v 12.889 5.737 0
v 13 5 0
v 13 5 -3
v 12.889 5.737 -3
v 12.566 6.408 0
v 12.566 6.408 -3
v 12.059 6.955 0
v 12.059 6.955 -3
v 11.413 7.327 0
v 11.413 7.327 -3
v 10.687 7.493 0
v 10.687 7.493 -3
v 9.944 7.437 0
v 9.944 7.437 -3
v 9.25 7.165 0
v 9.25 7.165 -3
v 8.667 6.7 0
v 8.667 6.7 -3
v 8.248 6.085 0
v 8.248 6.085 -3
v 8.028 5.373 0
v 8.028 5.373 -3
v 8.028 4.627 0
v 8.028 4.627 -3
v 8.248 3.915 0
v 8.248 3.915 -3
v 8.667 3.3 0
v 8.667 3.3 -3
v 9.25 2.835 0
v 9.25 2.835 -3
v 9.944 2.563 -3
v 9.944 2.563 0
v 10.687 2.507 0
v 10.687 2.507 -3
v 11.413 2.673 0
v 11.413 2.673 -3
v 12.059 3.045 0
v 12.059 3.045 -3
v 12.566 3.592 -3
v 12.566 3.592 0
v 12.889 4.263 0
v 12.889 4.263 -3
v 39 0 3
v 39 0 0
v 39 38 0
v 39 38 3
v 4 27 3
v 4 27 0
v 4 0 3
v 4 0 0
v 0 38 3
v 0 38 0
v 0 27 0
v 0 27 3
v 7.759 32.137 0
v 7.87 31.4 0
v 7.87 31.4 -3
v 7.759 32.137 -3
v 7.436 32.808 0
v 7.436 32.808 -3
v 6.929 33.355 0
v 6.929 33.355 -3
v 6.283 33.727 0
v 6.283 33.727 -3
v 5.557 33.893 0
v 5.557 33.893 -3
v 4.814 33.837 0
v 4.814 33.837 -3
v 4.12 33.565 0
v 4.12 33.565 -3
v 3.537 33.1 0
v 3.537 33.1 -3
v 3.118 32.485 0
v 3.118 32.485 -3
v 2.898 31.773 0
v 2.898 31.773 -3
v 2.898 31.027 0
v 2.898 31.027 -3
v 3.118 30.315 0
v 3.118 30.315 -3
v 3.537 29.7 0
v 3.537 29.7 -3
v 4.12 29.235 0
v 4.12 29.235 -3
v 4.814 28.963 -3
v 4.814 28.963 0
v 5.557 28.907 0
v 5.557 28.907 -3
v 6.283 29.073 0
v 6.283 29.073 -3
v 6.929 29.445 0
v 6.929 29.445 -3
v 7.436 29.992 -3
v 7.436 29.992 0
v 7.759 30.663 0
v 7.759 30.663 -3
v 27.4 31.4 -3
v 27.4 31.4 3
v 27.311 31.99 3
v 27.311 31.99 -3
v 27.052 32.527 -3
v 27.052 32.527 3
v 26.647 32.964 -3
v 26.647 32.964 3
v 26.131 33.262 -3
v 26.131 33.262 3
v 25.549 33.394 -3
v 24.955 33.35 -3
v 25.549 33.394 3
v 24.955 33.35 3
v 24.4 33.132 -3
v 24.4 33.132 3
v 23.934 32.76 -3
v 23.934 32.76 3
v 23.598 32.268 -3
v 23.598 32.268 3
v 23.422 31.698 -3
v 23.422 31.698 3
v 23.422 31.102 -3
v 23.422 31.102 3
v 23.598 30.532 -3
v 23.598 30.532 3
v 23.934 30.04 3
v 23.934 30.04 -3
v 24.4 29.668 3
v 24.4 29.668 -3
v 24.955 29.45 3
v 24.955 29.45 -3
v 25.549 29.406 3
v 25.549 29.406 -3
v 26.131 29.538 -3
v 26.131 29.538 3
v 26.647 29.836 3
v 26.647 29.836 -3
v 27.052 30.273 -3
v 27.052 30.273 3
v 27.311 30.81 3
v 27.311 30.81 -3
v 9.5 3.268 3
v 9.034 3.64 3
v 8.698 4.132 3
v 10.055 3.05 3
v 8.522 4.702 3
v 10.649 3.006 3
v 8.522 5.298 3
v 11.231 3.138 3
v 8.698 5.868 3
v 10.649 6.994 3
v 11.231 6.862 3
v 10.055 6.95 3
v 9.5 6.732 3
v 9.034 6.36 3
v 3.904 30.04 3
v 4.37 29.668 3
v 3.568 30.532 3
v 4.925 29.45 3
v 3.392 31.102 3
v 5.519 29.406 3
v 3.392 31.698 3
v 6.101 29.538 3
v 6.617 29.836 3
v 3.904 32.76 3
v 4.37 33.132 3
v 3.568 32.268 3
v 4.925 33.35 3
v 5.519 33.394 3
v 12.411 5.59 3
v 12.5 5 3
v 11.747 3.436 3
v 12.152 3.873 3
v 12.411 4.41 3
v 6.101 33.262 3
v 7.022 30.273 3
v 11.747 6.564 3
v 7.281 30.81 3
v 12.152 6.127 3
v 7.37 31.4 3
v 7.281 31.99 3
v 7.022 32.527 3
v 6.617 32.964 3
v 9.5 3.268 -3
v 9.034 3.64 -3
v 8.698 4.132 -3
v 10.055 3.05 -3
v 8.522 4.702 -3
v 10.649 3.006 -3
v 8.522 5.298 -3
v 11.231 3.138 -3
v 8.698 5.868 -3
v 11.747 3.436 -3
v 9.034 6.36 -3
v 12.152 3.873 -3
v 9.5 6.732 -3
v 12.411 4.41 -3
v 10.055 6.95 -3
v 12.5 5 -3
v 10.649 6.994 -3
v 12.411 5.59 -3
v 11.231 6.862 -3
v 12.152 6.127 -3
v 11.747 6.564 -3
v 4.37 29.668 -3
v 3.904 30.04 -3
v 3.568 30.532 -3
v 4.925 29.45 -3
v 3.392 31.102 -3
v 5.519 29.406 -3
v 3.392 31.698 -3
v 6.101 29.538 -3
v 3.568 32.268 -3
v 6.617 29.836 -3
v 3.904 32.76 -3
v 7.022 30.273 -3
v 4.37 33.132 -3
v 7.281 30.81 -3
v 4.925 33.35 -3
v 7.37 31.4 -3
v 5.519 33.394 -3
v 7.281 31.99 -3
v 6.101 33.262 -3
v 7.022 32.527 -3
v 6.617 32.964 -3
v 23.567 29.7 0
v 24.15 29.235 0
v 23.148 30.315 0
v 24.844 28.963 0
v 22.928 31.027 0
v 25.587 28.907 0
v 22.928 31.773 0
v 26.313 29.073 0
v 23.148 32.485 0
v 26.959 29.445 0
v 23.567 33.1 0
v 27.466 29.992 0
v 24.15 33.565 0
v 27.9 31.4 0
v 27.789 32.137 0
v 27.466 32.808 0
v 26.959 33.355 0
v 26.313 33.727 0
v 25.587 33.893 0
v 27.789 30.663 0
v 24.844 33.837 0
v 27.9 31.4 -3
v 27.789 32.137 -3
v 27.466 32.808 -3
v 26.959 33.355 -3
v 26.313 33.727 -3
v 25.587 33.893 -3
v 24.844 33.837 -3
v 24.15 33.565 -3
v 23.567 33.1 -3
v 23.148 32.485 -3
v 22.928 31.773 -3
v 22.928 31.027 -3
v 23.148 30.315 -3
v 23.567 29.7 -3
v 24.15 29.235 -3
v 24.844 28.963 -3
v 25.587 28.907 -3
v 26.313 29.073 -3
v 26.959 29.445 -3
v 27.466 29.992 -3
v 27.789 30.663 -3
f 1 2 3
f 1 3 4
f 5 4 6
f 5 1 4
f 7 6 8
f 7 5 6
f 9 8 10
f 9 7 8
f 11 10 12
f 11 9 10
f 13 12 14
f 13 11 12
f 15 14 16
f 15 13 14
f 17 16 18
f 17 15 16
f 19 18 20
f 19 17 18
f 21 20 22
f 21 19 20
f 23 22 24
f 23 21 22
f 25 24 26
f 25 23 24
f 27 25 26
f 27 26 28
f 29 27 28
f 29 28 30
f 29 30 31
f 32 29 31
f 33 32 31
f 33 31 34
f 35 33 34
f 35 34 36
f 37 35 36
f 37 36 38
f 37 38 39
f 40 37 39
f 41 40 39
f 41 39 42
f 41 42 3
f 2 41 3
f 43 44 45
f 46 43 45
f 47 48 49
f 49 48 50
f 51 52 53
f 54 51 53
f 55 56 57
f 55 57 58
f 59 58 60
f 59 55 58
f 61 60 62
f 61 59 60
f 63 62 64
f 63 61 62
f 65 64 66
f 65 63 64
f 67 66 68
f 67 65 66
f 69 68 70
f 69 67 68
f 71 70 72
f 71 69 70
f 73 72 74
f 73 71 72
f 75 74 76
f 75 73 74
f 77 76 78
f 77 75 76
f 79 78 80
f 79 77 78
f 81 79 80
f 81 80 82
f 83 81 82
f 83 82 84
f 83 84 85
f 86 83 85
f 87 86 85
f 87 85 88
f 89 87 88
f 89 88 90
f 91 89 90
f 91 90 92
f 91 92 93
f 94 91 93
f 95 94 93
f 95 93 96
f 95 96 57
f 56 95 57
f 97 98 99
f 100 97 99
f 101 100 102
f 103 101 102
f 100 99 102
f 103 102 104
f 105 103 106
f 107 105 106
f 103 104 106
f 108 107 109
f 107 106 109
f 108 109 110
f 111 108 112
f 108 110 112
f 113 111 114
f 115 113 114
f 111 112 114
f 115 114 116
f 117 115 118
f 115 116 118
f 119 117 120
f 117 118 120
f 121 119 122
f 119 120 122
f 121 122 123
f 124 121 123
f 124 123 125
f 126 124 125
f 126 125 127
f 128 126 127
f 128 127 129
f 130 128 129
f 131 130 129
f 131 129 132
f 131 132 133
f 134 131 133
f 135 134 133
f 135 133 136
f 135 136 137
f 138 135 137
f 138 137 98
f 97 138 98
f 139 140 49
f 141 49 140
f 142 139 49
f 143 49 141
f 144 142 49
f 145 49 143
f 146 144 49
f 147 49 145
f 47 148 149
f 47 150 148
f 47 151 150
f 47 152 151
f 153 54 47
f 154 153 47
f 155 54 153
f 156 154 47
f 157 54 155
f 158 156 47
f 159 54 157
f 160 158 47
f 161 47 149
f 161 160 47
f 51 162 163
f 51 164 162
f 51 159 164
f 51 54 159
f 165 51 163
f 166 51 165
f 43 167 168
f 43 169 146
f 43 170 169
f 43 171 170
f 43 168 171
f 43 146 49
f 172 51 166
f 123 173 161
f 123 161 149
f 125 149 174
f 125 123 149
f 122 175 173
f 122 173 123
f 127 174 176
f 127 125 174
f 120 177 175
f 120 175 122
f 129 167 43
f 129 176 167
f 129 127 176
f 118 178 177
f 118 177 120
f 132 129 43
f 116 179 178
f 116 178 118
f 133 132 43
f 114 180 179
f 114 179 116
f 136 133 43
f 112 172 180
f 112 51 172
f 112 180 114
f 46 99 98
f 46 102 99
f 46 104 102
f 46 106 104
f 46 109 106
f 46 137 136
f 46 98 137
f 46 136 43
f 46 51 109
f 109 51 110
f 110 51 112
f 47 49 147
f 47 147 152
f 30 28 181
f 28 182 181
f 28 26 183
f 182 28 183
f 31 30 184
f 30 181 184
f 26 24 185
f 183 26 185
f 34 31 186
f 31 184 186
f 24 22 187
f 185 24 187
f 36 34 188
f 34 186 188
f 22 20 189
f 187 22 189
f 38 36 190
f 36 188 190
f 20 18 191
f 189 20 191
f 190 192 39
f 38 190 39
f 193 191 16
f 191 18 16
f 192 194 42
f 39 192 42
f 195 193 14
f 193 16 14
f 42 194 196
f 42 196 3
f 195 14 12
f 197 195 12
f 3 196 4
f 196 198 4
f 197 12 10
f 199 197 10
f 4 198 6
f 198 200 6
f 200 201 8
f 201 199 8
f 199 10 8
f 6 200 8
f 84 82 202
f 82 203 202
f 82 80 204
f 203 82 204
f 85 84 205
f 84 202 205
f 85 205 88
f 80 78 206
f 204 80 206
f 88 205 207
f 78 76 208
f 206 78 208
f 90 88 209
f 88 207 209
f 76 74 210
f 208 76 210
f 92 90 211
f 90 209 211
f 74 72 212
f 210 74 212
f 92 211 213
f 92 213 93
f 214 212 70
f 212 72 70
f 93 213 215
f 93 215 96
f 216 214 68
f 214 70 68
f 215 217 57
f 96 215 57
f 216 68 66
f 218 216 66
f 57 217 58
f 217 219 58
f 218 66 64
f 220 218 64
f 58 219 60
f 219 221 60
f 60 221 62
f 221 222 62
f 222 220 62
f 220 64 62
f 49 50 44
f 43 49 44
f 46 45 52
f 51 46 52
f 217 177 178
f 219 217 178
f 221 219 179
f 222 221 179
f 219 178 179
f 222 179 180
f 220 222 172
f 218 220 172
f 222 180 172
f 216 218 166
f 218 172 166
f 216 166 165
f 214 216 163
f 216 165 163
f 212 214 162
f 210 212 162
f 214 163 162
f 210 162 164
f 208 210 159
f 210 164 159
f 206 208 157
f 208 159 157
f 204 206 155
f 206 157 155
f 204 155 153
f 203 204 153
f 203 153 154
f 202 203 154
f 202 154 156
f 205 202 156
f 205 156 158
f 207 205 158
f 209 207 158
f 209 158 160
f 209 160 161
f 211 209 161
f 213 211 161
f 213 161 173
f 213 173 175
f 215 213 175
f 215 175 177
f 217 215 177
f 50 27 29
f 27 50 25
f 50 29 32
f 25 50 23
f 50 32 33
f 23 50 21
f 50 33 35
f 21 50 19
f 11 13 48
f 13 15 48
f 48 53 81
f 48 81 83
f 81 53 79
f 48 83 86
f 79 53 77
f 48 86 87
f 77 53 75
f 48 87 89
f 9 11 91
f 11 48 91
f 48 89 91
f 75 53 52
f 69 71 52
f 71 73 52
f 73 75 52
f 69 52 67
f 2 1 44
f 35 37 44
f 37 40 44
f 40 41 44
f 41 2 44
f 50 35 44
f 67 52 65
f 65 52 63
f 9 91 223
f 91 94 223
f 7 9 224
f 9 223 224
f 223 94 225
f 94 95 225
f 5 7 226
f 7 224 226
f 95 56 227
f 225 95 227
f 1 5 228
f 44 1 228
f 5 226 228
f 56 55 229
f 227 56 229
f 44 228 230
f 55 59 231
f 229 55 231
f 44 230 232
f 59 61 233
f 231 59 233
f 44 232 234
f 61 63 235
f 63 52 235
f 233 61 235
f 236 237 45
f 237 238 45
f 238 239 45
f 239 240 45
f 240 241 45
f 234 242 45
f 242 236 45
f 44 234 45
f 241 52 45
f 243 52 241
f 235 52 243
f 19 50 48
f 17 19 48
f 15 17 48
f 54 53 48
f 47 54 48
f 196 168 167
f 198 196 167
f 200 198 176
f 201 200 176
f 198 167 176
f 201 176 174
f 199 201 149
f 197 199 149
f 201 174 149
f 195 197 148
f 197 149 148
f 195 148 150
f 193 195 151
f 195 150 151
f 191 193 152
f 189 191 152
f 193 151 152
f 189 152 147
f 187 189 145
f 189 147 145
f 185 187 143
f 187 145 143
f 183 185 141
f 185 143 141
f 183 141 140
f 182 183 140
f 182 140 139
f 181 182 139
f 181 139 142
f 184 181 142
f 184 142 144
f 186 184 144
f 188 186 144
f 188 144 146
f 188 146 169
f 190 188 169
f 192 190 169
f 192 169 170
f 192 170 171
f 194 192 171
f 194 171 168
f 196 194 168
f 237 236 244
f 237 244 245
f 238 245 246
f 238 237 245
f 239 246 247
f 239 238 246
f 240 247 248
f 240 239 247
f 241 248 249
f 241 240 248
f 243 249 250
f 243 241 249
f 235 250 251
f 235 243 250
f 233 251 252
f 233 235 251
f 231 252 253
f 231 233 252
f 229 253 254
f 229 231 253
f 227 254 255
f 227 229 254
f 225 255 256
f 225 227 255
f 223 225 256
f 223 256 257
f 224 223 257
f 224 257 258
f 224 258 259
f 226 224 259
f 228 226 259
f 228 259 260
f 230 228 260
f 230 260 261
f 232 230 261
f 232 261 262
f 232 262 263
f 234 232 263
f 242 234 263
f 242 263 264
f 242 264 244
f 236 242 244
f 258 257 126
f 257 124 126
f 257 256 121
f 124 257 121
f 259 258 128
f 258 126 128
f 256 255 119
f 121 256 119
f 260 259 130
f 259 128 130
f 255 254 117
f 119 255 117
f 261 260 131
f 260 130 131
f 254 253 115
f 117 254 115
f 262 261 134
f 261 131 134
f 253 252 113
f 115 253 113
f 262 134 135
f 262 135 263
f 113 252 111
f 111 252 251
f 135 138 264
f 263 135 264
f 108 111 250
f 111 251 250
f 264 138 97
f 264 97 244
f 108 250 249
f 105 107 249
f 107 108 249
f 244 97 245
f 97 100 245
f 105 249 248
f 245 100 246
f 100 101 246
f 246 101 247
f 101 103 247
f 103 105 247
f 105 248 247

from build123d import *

# Parameters (mm, degrees)
BOSS_EXTRUDE1_DEPTH = 3
SKETCH2_R           = 2
CUT_EXTRUDE1_DEPTH  = 3
SKETCH3_R           = 2.5
SKETCH3_R_2         = 2
BOSS_EXTRUDE2_DEPTH = 6


with BuildPart() as part:
    # Sketch1 → Boss-Extrude1 (new body)
    with BuildSketch(Plane.XY):
        Polygon((4, 0), (39, 0), (39, 38), (0, 38), (0, 27), (4, 27), align=None)
    extrude(amount=BOSS_EXTRUDE1_DEPTH)

    # Sketch2 → Cut-Extrude1 (cut)
    with BuildSketch(Plane.XY.offset(3)):
        with Locations((5.37, 31.4)):
            Circle(SKETCH2_R)
        with Locations((25.4, 31.4)):
            Circle(SKETCH2_R)
        with Locations((10.5, 5)):
            Circle(SKETCH2_R)
    extrude(amount=-CUT_EXTRUDE1_DEPTH, mode=Mode.SUBTRACT)

    # Sketch3 → Boss-Extrude2 (add)
    with BuildSketch(Plane.XY.offset(3)):
        with Locations((5.37, 31.4)):
            Circle(SKETCH3_R)
        with Locations((5.37, 31.4)):
            Circle(SKETCH3_R_2, mode=Mode.SUBTRACT)
        with Locations((25.4, 31.4)):
            Circle(SKETCH3_R)
        with Locations((25.4, 31.4)):
            Circle(SKETCH3_R_2, mode=Mode.SUBTRACT)
        with Locations((10.5, 5)):
            Circle(SKETCH3_R)
        with Locations((10.5, 5)):
            Circle(SKETCH3_R_2, mode=Mode.SUBTRACT)
    extrude(amount=-BOSS_EXTRUDE2_DEPTH)


solid = part.part
